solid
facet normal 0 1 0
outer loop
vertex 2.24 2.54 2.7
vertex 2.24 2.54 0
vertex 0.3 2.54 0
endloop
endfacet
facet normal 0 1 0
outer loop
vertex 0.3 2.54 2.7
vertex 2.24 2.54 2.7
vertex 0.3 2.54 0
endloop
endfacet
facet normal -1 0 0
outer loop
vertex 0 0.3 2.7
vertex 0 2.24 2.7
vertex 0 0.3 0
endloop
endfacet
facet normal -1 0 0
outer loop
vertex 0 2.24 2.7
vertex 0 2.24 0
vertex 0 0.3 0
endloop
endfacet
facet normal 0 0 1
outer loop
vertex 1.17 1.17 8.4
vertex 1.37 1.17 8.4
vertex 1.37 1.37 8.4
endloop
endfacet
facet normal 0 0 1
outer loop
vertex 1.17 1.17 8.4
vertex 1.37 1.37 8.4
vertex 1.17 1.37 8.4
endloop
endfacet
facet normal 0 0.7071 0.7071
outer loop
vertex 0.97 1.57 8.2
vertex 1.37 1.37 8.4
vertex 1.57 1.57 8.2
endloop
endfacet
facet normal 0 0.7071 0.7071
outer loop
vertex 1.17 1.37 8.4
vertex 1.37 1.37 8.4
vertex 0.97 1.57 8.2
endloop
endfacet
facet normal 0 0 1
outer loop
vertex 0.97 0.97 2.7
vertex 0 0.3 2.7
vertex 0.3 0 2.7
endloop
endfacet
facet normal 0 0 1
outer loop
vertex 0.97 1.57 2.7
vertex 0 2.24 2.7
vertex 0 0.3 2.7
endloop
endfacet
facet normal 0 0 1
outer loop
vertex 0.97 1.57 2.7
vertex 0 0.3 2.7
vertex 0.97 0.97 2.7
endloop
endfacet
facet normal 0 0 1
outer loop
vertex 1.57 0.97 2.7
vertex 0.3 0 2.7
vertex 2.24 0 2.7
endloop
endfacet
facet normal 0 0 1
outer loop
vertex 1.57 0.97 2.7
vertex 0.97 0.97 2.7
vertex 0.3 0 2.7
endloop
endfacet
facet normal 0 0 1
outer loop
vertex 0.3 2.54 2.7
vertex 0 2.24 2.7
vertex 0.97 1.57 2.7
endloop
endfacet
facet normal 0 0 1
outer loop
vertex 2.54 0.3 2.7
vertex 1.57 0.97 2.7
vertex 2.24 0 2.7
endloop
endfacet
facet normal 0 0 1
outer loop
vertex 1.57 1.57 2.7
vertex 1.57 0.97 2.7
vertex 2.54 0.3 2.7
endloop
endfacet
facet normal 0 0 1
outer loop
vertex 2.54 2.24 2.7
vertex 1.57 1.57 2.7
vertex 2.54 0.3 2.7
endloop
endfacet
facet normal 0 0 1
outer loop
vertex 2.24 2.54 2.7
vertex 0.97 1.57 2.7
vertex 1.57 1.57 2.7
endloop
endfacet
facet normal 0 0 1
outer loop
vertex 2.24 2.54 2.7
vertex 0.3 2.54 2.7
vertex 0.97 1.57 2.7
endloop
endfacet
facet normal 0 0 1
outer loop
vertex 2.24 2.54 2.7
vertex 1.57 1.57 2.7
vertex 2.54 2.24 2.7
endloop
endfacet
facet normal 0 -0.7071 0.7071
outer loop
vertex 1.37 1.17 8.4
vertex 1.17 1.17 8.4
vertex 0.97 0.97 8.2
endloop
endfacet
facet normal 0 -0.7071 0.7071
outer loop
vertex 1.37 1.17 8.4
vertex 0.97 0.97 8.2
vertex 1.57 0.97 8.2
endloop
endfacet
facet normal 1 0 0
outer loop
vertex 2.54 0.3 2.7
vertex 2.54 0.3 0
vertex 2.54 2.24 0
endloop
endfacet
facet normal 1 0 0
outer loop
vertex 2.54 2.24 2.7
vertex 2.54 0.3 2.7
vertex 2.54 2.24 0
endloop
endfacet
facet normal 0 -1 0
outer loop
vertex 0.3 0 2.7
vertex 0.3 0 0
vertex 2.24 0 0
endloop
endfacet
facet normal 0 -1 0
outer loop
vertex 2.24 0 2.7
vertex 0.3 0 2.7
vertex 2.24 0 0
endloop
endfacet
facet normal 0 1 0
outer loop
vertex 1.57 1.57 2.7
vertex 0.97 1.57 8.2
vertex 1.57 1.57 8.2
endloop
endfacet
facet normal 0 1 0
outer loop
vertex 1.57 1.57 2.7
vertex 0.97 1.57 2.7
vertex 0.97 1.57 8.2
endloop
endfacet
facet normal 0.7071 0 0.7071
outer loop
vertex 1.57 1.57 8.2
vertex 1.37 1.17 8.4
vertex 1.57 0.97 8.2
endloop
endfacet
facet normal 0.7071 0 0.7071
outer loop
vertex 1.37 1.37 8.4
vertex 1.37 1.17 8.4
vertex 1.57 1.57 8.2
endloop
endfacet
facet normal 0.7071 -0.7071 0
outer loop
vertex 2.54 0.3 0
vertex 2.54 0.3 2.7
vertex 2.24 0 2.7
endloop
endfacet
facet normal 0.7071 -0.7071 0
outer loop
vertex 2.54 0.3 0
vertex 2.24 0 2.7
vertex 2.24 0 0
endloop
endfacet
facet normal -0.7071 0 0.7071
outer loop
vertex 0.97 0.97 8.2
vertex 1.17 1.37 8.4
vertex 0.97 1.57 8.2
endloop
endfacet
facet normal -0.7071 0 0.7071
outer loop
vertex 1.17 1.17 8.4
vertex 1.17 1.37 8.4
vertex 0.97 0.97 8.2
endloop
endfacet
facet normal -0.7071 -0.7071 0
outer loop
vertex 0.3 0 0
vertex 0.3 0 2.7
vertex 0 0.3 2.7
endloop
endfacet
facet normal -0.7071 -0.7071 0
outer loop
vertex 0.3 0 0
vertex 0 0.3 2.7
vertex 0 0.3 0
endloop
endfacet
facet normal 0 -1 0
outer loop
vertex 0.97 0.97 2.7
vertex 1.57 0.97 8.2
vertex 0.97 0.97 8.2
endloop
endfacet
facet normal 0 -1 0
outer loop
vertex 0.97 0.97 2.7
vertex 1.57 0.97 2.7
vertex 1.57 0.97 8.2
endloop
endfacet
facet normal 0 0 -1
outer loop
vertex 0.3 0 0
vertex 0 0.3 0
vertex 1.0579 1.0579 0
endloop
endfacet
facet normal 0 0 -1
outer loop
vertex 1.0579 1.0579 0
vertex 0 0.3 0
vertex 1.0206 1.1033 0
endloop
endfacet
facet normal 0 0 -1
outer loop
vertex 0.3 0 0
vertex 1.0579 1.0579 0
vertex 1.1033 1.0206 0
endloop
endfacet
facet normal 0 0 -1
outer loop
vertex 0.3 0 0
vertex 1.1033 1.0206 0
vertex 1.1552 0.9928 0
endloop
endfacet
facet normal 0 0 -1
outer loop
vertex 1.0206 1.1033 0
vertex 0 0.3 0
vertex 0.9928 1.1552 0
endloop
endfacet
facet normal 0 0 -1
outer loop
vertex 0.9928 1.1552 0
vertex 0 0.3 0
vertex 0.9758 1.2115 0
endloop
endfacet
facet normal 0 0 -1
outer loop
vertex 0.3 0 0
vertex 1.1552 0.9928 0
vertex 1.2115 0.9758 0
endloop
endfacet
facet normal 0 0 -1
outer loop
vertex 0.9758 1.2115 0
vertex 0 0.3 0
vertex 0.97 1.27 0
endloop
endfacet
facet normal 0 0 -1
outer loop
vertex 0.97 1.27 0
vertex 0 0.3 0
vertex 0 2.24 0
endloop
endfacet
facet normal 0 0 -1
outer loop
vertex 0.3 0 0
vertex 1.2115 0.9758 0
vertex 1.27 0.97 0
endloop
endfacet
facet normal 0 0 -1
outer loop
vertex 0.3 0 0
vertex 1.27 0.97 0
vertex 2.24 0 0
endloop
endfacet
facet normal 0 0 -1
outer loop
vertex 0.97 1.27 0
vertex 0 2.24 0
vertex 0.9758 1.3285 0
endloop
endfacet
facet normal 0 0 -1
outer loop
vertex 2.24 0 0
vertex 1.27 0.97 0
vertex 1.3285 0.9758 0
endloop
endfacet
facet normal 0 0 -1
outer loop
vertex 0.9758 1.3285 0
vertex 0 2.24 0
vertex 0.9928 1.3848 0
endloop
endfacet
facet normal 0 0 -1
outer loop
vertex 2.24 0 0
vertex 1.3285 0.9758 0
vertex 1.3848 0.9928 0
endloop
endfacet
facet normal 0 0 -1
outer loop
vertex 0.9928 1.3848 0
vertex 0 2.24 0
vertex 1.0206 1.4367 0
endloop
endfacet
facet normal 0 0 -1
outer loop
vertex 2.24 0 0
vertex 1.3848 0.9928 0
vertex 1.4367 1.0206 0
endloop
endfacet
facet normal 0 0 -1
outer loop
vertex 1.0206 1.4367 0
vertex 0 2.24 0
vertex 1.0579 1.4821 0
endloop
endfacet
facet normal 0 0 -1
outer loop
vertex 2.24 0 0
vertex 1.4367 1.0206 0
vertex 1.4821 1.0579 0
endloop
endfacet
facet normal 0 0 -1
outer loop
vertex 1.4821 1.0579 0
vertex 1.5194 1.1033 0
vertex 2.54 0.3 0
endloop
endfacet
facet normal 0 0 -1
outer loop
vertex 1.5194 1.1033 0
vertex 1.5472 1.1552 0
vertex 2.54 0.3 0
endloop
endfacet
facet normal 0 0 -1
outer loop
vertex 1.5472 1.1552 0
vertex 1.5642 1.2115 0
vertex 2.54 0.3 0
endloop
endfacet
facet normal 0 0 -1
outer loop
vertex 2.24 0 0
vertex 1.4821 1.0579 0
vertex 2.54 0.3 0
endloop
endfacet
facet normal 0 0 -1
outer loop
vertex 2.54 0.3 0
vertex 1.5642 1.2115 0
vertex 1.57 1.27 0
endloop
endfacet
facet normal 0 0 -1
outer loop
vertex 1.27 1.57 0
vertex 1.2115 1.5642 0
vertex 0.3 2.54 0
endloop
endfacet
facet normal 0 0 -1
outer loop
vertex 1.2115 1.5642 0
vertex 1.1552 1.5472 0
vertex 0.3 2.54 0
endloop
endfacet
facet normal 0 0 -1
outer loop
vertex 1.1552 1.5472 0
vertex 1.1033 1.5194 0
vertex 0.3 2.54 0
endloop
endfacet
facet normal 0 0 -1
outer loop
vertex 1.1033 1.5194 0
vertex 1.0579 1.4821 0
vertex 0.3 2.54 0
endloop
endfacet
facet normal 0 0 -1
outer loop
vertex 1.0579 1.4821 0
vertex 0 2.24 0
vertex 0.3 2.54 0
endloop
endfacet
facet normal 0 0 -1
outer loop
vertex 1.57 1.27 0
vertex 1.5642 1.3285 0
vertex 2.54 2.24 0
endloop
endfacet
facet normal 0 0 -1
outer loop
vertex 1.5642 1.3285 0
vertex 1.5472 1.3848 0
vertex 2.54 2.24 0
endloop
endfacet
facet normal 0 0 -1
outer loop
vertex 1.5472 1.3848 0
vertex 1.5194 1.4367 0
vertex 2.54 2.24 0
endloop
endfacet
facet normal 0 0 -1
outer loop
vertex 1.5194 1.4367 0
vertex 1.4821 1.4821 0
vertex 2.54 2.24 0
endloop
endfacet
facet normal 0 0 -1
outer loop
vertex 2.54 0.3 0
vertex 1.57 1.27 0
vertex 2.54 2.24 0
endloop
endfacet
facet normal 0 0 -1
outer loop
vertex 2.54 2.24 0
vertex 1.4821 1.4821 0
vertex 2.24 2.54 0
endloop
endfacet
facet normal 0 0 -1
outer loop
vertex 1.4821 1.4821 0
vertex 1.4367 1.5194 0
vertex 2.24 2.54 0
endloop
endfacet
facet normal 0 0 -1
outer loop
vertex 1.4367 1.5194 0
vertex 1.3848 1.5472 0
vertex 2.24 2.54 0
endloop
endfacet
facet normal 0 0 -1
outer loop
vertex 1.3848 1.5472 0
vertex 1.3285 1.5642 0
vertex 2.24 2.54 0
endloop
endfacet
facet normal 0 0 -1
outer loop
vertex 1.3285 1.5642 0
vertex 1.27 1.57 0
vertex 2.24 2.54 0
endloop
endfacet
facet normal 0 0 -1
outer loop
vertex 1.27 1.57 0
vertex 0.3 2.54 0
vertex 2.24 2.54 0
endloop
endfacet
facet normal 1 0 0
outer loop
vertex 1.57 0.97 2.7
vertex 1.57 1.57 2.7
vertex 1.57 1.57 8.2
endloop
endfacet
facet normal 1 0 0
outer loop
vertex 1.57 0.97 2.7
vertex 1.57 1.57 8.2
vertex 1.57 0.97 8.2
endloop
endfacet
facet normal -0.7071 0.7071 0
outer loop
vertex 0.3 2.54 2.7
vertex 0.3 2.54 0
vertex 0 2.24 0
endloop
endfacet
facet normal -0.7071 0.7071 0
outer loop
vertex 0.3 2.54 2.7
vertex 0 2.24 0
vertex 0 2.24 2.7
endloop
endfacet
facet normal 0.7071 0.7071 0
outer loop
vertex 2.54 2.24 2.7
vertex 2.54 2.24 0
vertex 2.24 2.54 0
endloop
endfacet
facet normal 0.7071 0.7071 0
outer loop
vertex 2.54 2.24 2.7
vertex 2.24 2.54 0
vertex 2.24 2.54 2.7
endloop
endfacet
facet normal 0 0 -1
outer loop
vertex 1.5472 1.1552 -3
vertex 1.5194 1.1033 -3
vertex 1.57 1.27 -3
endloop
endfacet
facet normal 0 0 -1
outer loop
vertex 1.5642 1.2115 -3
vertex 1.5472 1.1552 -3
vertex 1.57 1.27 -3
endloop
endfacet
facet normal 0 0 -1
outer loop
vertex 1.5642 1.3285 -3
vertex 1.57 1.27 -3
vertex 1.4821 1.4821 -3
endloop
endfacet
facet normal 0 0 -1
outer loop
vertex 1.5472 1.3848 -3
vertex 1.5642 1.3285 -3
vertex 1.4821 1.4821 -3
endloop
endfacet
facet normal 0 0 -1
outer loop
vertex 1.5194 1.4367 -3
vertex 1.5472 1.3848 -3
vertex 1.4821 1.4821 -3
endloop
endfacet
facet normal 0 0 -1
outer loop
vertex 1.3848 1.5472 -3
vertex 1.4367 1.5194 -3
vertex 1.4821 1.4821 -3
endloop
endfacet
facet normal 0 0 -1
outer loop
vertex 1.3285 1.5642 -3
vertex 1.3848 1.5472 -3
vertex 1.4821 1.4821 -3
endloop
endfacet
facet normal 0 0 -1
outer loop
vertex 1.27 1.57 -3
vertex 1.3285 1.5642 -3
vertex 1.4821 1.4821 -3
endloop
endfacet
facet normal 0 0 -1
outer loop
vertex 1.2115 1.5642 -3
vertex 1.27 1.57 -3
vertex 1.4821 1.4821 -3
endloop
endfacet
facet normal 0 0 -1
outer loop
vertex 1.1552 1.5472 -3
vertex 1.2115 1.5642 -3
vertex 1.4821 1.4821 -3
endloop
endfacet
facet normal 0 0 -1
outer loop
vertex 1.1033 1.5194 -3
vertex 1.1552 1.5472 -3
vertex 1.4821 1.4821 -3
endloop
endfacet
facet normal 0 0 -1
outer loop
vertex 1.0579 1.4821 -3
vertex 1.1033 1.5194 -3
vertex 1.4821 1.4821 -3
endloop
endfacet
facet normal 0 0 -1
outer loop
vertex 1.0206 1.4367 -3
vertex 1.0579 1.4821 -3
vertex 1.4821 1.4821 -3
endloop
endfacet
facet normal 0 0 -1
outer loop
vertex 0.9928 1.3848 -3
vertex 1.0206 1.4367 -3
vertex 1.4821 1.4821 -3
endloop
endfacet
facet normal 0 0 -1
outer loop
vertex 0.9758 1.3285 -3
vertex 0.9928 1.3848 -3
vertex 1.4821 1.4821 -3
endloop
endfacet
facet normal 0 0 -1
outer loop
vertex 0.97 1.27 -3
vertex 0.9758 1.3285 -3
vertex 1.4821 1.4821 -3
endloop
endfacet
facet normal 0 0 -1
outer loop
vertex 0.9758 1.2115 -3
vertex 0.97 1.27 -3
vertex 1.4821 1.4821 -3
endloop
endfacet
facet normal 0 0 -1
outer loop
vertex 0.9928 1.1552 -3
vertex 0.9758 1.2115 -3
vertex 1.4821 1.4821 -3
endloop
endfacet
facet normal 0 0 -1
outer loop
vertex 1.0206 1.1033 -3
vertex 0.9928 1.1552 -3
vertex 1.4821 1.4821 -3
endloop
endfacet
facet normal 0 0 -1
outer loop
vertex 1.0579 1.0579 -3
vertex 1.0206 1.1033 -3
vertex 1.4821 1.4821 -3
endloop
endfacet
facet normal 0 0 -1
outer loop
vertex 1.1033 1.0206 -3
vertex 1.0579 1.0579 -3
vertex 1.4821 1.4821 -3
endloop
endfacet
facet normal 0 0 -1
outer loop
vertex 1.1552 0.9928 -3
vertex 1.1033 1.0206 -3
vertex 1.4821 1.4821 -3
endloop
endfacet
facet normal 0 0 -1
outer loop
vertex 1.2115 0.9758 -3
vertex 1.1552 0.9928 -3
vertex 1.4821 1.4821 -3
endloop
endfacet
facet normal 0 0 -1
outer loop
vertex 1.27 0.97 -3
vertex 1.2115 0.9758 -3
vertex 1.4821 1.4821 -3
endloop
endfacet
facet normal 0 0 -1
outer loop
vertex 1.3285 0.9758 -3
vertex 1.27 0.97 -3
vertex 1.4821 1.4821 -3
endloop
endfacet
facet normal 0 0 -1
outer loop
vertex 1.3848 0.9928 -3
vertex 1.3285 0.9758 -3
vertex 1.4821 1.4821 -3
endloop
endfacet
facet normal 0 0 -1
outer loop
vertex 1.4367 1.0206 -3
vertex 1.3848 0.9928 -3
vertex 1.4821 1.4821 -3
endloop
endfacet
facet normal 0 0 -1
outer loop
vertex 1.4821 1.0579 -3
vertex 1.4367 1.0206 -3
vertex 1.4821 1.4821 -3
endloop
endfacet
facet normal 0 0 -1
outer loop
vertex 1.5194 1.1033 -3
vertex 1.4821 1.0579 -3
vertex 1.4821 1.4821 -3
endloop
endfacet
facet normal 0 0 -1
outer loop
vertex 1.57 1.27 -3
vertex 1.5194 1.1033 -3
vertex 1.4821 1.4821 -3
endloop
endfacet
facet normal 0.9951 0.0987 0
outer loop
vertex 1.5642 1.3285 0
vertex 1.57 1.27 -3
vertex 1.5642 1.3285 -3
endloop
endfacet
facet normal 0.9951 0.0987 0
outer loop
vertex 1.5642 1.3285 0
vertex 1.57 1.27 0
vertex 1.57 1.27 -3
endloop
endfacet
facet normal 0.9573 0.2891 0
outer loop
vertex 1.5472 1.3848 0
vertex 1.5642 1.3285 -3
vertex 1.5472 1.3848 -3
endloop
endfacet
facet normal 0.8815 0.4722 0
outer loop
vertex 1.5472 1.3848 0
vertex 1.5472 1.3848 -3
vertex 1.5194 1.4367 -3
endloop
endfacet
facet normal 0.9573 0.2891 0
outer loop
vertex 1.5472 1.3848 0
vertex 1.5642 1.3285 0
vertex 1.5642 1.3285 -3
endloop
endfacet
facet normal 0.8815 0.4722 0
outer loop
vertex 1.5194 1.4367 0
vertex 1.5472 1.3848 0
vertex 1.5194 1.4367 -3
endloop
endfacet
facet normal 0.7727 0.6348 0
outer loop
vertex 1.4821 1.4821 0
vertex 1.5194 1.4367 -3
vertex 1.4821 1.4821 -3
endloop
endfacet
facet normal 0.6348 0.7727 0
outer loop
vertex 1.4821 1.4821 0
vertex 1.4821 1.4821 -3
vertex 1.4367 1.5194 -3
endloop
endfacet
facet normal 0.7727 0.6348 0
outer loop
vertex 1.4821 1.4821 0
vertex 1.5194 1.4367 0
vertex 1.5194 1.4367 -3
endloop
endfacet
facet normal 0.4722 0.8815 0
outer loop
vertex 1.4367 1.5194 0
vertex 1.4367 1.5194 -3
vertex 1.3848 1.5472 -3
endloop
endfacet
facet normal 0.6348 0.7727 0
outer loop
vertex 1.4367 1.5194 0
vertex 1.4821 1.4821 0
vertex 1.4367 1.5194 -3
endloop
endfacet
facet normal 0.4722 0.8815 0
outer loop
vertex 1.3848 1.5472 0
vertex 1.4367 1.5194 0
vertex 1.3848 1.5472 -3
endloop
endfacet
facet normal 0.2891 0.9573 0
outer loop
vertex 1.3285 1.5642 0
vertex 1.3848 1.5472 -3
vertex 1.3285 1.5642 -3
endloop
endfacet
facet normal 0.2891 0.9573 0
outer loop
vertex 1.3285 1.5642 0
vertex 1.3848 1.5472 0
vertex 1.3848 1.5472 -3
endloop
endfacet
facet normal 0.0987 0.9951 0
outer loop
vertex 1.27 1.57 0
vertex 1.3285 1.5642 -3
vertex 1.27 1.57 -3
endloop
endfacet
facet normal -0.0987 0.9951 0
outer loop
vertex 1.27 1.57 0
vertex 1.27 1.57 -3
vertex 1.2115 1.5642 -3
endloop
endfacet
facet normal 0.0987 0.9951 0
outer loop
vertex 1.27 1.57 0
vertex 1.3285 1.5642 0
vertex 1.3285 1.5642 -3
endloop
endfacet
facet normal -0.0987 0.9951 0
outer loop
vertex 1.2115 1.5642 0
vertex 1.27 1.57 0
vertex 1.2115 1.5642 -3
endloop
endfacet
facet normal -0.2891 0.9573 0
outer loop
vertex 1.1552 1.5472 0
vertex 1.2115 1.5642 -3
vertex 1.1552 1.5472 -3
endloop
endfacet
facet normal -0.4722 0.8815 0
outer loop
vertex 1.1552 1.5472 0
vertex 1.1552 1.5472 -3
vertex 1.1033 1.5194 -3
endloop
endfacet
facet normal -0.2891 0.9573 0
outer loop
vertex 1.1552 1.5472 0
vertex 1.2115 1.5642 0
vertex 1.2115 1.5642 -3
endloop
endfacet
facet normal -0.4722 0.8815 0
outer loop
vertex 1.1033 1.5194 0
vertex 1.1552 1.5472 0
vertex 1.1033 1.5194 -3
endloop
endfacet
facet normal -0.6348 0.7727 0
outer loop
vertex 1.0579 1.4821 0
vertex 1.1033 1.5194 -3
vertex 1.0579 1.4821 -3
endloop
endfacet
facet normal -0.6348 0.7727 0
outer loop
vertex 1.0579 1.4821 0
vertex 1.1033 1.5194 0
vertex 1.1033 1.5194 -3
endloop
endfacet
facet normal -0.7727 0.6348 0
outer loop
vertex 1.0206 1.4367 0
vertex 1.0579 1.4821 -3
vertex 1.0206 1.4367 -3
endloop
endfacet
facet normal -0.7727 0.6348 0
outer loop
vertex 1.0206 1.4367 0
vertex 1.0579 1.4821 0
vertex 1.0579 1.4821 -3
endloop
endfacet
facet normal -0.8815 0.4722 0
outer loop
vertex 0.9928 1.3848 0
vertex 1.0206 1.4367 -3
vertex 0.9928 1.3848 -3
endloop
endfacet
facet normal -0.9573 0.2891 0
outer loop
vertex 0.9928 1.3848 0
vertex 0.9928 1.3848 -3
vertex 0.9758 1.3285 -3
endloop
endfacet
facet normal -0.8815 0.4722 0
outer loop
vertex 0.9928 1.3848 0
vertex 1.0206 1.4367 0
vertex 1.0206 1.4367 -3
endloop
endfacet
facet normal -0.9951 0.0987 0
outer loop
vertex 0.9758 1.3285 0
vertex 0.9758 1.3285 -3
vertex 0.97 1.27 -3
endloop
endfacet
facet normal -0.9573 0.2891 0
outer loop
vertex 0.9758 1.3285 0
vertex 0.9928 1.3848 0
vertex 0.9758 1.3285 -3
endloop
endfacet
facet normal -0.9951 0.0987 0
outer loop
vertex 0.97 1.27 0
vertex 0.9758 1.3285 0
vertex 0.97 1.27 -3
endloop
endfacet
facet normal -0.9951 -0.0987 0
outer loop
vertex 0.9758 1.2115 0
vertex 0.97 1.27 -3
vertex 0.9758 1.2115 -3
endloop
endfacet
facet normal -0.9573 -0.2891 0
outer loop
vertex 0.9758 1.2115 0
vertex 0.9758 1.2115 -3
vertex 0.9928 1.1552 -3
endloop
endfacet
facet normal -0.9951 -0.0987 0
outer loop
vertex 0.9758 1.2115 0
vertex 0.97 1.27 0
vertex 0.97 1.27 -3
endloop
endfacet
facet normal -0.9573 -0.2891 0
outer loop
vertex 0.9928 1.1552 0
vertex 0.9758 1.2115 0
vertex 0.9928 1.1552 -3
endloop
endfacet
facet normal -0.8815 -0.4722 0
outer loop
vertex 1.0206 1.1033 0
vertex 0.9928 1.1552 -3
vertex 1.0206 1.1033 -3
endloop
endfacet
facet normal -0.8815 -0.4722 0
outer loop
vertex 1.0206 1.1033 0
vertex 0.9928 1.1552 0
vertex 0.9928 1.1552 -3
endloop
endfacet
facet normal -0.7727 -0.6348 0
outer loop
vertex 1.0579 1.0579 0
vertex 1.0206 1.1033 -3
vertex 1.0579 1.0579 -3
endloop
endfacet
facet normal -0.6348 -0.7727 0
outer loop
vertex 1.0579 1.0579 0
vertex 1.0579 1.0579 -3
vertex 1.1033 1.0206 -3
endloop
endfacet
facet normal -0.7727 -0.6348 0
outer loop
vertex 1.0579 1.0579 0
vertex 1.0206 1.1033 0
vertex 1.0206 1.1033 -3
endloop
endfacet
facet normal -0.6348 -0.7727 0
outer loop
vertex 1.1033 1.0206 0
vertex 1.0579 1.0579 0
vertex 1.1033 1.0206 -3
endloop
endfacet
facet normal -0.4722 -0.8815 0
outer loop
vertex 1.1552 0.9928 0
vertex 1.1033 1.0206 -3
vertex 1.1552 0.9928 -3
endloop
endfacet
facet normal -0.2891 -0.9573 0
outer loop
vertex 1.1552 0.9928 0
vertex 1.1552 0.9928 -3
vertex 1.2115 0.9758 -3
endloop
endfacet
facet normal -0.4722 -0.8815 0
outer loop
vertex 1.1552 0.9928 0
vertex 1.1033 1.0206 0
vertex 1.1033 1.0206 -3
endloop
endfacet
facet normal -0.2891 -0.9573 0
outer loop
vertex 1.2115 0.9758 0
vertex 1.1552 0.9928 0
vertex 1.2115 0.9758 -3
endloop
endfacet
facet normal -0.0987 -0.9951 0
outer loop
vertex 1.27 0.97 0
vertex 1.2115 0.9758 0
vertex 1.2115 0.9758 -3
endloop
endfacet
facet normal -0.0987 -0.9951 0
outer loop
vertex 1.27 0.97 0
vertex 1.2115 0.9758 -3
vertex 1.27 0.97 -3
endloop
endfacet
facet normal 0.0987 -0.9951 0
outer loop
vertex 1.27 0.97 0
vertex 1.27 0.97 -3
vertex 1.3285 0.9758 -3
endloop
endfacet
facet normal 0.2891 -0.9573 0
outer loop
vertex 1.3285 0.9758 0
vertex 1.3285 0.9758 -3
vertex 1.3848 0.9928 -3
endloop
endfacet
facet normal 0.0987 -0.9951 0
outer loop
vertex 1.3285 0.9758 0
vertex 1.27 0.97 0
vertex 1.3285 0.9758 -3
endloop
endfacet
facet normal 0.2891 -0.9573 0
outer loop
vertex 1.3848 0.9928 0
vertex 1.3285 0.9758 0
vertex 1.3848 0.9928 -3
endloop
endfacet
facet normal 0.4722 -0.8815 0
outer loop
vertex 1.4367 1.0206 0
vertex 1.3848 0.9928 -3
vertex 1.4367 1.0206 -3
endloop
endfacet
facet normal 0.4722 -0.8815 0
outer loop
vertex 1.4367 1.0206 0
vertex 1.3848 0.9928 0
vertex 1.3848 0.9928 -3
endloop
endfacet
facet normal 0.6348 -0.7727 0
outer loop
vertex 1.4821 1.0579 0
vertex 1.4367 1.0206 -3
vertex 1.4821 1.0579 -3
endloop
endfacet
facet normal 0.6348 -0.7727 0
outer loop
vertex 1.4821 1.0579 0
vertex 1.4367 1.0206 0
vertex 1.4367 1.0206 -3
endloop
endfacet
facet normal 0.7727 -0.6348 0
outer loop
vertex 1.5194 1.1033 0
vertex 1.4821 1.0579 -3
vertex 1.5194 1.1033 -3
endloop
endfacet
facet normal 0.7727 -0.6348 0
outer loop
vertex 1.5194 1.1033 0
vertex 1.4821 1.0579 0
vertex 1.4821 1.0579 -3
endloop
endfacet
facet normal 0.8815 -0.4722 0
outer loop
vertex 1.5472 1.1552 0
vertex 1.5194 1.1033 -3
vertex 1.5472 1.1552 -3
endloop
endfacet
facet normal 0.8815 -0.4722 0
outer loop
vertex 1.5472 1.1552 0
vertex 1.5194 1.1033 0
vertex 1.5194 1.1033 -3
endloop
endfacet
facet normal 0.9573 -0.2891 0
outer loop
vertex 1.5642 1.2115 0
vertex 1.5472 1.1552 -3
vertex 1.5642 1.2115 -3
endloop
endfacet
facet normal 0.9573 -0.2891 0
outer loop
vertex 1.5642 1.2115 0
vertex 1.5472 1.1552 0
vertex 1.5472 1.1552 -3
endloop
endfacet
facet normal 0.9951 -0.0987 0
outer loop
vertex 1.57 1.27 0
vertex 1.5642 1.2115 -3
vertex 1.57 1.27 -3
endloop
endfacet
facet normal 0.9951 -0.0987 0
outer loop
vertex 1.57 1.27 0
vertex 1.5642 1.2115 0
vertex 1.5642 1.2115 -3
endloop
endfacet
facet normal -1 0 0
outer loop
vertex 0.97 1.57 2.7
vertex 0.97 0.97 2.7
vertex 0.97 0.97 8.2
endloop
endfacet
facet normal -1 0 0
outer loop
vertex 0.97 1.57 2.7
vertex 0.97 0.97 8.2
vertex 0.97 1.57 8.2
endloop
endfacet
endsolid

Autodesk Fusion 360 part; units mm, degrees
sketch "スケッチ1" plane through (0, 0, 0) normal (0, 0, 1) x (1, 0, 0)
  line L0 (0, 0) -> (2.54, 0)
  line L1 (2.54, 0) -> (2.54, 2.54)
  line L2 (2.54, 2.54) -> (0, 2.54)
  line L3 (0, 2.54) -> (0, 0)
  circle A0 centre (1.27, 1.27) radius 0.3
  dimension "d1" = 2.54
  dimension "d2" = 2.54
  dimension "d12" = 0.6
  dimension "d13" = 1.27
  dimension "d14" = 1.27
extrude "押し出し1" add sketch "スケッチ1" along normal blind 2.7 contours L0 L1 L2 L3 | A0
sketch "スケッチ2" plane through (0, 0, 2.7) normal (0, 0, 1) x (-1, 0, 0)
  line L0 (0, -2.54) -> (0, 0)
  line L1 (0, 0) -> (-2.54, 0)
  line L2 (-2.54, 0) -> (-2.54, -2.54)
  line L3 (-2.54, -2.54) -> (0, -2.54)
  line L4 (-0.97, -1.57) -> (-1.57, -1.57)
  line L5 (-1.57, -1.57) -> (-1.57, -0.97)
  line L6 (-1.57, -0.97) -> (-0.97, -0.97)
  line L7 (-0.97, -0.97) -> (-0.97, -1.57)
  dimension "d5" = 0.6
  dimension "d6" = 0.6
  dimension "d7" = 0.97
  dimension "d8" = 0.97
extrude "押し出し2" add sketch "スケッチ2" along normal blind 5.7 contours L4 L5 L6 L7
chamfer "面取り1" distance 0.2 angle 45 4 edges at (1.27, 0.97, 8.4) (1.57, 1.27, 8.4) (1.27, 1.57, 8.4) (0.97, 1.27, 8.4)
extrude "押し出し3" add sketch "スケッチ1" against normal blind 3 contours A0
chamfer "面取り2" distance 0.3 angle 45 4 edges at (0, 2.54, 1.35) (0, 0, 1.35) (2.54, 0, 1.35) (2.54, 2.54, 1.35)
